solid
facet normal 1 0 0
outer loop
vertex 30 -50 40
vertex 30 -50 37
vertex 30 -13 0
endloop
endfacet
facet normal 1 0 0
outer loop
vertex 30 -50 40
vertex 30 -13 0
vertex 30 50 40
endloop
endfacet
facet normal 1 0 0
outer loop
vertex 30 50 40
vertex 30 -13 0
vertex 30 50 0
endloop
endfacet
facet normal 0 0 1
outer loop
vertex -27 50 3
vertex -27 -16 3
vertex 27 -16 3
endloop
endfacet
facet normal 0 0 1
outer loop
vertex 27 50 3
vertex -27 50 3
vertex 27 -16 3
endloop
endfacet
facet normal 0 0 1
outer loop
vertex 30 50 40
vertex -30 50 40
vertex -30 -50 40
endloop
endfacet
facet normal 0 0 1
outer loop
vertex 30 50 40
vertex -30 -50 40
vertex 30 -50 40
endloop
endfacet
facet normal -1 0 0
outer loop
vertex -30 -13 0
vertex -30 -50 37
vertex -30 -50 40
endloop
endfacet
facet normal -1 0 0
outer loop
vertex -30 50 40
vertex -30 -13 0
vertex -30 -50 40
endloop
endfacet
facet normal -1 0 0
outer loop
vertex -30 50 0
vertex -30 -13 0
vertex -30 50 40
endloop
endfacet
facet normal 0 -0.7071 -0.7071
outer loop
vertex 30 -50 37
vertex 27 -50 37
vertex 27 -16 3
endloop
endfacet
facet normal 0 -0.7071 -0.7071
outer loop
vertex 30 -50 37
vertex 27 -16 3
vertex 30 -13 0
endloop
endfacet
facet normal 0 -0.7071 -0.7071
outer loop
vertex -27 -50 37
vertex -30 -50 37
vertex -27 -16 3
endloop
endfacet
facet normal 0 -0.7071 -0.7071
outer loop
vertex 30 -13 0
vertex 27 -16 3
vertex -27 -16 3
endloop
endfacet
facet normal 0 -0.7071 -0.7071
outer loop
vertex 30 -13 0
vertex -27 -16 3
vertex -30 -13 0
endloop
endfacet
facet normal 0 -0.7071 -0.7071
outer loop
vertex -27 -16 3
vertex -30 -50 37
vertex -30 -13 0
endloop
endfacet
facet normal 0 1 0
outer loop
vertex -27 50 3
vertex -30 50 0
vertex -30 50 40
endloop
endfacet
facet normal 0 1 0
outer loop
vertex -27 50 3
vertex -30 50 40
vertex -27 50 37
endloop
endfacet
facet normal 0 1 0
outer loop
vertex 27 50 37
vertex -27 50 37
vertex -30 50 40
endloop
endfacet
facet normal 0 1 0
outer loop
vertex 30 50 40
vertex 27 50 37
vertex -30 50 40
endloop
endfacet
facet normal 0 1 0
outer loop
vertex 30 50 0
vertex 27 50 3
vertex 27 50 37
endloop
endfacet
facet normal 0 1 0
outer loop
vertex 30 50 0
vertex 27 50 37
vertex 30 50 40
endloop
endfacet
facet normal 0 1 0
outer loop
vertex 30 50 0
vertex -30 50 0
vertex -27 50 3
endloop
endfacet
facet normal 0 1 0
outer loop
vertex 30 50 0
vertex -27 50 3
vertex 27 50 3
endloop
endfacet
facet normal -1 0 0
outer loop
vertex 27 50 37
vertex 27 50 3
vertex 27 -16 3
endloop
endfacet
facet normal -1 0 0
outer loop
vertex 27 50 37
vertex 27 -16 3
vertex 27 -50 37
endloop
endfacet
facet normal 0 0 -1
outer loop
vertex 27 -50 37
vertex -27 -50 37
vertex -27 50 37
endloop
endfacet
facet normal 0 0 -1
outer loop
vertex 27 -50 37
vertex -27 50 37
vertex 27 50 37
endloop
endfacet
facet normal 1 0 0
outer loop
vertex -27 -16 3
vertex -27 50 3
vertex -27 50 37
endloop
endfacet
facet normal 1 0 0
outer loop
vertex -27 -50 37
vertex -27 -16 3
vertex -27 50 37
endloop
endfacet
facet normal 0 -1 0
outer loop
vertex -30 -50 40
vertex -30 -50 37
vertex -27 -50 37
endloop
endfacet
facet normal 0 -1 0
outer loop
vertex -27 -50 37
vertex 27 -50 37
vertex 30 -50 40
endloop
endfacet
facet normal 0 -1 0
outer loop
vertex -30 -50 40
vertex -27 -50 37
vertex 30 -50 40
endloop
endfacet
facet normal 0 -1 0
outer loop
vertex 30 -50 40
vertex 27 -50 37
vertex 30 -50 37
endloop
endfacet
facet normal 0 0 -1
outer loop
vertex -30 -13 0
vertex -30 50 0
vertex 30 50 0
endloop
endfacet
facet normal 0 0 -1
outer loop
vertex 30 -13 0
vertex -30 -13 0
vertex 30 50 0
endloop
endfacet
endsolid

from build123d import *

# Parameters (mm, degrees)
F0_W     = 60
F0_H     = 100
F1_DEPTH = 40
F2_W     = 54
F2_H     = 34
F3_DEPTH = 141
F5_DEPTH = 60


with BuildPart() as f1:
    # F0 (on Top) → F1 (new body)
    with BuildSketch(Plane.XY):
        Rectangle(F0_W, F0_H)
    extrude(amount=F1_DEPTH)

    # F2 (on face) → F3 (cut)
    with BuildSketch(Plane.XZ.offset(50)):
        with Locations((0, 20)):
            Rectangle(F2_W, F2_H)
    extrude(amount=-F3_DEPTH, mode=Mode.SUBTRACT)

    # F4 (on face) → F5 (cut)
    with BuildSketch(Plane(origin=(-30, 0, 0), x_dir=(0, -1, 0), z_dir=(-1, 0, 0))):
        Polygon((50, 37), (13, 0), (50, 0), align=None)
    extrude(amount=-F5_DEPTH, mode=Mode.SUBTRACT)


solid = f1.part
